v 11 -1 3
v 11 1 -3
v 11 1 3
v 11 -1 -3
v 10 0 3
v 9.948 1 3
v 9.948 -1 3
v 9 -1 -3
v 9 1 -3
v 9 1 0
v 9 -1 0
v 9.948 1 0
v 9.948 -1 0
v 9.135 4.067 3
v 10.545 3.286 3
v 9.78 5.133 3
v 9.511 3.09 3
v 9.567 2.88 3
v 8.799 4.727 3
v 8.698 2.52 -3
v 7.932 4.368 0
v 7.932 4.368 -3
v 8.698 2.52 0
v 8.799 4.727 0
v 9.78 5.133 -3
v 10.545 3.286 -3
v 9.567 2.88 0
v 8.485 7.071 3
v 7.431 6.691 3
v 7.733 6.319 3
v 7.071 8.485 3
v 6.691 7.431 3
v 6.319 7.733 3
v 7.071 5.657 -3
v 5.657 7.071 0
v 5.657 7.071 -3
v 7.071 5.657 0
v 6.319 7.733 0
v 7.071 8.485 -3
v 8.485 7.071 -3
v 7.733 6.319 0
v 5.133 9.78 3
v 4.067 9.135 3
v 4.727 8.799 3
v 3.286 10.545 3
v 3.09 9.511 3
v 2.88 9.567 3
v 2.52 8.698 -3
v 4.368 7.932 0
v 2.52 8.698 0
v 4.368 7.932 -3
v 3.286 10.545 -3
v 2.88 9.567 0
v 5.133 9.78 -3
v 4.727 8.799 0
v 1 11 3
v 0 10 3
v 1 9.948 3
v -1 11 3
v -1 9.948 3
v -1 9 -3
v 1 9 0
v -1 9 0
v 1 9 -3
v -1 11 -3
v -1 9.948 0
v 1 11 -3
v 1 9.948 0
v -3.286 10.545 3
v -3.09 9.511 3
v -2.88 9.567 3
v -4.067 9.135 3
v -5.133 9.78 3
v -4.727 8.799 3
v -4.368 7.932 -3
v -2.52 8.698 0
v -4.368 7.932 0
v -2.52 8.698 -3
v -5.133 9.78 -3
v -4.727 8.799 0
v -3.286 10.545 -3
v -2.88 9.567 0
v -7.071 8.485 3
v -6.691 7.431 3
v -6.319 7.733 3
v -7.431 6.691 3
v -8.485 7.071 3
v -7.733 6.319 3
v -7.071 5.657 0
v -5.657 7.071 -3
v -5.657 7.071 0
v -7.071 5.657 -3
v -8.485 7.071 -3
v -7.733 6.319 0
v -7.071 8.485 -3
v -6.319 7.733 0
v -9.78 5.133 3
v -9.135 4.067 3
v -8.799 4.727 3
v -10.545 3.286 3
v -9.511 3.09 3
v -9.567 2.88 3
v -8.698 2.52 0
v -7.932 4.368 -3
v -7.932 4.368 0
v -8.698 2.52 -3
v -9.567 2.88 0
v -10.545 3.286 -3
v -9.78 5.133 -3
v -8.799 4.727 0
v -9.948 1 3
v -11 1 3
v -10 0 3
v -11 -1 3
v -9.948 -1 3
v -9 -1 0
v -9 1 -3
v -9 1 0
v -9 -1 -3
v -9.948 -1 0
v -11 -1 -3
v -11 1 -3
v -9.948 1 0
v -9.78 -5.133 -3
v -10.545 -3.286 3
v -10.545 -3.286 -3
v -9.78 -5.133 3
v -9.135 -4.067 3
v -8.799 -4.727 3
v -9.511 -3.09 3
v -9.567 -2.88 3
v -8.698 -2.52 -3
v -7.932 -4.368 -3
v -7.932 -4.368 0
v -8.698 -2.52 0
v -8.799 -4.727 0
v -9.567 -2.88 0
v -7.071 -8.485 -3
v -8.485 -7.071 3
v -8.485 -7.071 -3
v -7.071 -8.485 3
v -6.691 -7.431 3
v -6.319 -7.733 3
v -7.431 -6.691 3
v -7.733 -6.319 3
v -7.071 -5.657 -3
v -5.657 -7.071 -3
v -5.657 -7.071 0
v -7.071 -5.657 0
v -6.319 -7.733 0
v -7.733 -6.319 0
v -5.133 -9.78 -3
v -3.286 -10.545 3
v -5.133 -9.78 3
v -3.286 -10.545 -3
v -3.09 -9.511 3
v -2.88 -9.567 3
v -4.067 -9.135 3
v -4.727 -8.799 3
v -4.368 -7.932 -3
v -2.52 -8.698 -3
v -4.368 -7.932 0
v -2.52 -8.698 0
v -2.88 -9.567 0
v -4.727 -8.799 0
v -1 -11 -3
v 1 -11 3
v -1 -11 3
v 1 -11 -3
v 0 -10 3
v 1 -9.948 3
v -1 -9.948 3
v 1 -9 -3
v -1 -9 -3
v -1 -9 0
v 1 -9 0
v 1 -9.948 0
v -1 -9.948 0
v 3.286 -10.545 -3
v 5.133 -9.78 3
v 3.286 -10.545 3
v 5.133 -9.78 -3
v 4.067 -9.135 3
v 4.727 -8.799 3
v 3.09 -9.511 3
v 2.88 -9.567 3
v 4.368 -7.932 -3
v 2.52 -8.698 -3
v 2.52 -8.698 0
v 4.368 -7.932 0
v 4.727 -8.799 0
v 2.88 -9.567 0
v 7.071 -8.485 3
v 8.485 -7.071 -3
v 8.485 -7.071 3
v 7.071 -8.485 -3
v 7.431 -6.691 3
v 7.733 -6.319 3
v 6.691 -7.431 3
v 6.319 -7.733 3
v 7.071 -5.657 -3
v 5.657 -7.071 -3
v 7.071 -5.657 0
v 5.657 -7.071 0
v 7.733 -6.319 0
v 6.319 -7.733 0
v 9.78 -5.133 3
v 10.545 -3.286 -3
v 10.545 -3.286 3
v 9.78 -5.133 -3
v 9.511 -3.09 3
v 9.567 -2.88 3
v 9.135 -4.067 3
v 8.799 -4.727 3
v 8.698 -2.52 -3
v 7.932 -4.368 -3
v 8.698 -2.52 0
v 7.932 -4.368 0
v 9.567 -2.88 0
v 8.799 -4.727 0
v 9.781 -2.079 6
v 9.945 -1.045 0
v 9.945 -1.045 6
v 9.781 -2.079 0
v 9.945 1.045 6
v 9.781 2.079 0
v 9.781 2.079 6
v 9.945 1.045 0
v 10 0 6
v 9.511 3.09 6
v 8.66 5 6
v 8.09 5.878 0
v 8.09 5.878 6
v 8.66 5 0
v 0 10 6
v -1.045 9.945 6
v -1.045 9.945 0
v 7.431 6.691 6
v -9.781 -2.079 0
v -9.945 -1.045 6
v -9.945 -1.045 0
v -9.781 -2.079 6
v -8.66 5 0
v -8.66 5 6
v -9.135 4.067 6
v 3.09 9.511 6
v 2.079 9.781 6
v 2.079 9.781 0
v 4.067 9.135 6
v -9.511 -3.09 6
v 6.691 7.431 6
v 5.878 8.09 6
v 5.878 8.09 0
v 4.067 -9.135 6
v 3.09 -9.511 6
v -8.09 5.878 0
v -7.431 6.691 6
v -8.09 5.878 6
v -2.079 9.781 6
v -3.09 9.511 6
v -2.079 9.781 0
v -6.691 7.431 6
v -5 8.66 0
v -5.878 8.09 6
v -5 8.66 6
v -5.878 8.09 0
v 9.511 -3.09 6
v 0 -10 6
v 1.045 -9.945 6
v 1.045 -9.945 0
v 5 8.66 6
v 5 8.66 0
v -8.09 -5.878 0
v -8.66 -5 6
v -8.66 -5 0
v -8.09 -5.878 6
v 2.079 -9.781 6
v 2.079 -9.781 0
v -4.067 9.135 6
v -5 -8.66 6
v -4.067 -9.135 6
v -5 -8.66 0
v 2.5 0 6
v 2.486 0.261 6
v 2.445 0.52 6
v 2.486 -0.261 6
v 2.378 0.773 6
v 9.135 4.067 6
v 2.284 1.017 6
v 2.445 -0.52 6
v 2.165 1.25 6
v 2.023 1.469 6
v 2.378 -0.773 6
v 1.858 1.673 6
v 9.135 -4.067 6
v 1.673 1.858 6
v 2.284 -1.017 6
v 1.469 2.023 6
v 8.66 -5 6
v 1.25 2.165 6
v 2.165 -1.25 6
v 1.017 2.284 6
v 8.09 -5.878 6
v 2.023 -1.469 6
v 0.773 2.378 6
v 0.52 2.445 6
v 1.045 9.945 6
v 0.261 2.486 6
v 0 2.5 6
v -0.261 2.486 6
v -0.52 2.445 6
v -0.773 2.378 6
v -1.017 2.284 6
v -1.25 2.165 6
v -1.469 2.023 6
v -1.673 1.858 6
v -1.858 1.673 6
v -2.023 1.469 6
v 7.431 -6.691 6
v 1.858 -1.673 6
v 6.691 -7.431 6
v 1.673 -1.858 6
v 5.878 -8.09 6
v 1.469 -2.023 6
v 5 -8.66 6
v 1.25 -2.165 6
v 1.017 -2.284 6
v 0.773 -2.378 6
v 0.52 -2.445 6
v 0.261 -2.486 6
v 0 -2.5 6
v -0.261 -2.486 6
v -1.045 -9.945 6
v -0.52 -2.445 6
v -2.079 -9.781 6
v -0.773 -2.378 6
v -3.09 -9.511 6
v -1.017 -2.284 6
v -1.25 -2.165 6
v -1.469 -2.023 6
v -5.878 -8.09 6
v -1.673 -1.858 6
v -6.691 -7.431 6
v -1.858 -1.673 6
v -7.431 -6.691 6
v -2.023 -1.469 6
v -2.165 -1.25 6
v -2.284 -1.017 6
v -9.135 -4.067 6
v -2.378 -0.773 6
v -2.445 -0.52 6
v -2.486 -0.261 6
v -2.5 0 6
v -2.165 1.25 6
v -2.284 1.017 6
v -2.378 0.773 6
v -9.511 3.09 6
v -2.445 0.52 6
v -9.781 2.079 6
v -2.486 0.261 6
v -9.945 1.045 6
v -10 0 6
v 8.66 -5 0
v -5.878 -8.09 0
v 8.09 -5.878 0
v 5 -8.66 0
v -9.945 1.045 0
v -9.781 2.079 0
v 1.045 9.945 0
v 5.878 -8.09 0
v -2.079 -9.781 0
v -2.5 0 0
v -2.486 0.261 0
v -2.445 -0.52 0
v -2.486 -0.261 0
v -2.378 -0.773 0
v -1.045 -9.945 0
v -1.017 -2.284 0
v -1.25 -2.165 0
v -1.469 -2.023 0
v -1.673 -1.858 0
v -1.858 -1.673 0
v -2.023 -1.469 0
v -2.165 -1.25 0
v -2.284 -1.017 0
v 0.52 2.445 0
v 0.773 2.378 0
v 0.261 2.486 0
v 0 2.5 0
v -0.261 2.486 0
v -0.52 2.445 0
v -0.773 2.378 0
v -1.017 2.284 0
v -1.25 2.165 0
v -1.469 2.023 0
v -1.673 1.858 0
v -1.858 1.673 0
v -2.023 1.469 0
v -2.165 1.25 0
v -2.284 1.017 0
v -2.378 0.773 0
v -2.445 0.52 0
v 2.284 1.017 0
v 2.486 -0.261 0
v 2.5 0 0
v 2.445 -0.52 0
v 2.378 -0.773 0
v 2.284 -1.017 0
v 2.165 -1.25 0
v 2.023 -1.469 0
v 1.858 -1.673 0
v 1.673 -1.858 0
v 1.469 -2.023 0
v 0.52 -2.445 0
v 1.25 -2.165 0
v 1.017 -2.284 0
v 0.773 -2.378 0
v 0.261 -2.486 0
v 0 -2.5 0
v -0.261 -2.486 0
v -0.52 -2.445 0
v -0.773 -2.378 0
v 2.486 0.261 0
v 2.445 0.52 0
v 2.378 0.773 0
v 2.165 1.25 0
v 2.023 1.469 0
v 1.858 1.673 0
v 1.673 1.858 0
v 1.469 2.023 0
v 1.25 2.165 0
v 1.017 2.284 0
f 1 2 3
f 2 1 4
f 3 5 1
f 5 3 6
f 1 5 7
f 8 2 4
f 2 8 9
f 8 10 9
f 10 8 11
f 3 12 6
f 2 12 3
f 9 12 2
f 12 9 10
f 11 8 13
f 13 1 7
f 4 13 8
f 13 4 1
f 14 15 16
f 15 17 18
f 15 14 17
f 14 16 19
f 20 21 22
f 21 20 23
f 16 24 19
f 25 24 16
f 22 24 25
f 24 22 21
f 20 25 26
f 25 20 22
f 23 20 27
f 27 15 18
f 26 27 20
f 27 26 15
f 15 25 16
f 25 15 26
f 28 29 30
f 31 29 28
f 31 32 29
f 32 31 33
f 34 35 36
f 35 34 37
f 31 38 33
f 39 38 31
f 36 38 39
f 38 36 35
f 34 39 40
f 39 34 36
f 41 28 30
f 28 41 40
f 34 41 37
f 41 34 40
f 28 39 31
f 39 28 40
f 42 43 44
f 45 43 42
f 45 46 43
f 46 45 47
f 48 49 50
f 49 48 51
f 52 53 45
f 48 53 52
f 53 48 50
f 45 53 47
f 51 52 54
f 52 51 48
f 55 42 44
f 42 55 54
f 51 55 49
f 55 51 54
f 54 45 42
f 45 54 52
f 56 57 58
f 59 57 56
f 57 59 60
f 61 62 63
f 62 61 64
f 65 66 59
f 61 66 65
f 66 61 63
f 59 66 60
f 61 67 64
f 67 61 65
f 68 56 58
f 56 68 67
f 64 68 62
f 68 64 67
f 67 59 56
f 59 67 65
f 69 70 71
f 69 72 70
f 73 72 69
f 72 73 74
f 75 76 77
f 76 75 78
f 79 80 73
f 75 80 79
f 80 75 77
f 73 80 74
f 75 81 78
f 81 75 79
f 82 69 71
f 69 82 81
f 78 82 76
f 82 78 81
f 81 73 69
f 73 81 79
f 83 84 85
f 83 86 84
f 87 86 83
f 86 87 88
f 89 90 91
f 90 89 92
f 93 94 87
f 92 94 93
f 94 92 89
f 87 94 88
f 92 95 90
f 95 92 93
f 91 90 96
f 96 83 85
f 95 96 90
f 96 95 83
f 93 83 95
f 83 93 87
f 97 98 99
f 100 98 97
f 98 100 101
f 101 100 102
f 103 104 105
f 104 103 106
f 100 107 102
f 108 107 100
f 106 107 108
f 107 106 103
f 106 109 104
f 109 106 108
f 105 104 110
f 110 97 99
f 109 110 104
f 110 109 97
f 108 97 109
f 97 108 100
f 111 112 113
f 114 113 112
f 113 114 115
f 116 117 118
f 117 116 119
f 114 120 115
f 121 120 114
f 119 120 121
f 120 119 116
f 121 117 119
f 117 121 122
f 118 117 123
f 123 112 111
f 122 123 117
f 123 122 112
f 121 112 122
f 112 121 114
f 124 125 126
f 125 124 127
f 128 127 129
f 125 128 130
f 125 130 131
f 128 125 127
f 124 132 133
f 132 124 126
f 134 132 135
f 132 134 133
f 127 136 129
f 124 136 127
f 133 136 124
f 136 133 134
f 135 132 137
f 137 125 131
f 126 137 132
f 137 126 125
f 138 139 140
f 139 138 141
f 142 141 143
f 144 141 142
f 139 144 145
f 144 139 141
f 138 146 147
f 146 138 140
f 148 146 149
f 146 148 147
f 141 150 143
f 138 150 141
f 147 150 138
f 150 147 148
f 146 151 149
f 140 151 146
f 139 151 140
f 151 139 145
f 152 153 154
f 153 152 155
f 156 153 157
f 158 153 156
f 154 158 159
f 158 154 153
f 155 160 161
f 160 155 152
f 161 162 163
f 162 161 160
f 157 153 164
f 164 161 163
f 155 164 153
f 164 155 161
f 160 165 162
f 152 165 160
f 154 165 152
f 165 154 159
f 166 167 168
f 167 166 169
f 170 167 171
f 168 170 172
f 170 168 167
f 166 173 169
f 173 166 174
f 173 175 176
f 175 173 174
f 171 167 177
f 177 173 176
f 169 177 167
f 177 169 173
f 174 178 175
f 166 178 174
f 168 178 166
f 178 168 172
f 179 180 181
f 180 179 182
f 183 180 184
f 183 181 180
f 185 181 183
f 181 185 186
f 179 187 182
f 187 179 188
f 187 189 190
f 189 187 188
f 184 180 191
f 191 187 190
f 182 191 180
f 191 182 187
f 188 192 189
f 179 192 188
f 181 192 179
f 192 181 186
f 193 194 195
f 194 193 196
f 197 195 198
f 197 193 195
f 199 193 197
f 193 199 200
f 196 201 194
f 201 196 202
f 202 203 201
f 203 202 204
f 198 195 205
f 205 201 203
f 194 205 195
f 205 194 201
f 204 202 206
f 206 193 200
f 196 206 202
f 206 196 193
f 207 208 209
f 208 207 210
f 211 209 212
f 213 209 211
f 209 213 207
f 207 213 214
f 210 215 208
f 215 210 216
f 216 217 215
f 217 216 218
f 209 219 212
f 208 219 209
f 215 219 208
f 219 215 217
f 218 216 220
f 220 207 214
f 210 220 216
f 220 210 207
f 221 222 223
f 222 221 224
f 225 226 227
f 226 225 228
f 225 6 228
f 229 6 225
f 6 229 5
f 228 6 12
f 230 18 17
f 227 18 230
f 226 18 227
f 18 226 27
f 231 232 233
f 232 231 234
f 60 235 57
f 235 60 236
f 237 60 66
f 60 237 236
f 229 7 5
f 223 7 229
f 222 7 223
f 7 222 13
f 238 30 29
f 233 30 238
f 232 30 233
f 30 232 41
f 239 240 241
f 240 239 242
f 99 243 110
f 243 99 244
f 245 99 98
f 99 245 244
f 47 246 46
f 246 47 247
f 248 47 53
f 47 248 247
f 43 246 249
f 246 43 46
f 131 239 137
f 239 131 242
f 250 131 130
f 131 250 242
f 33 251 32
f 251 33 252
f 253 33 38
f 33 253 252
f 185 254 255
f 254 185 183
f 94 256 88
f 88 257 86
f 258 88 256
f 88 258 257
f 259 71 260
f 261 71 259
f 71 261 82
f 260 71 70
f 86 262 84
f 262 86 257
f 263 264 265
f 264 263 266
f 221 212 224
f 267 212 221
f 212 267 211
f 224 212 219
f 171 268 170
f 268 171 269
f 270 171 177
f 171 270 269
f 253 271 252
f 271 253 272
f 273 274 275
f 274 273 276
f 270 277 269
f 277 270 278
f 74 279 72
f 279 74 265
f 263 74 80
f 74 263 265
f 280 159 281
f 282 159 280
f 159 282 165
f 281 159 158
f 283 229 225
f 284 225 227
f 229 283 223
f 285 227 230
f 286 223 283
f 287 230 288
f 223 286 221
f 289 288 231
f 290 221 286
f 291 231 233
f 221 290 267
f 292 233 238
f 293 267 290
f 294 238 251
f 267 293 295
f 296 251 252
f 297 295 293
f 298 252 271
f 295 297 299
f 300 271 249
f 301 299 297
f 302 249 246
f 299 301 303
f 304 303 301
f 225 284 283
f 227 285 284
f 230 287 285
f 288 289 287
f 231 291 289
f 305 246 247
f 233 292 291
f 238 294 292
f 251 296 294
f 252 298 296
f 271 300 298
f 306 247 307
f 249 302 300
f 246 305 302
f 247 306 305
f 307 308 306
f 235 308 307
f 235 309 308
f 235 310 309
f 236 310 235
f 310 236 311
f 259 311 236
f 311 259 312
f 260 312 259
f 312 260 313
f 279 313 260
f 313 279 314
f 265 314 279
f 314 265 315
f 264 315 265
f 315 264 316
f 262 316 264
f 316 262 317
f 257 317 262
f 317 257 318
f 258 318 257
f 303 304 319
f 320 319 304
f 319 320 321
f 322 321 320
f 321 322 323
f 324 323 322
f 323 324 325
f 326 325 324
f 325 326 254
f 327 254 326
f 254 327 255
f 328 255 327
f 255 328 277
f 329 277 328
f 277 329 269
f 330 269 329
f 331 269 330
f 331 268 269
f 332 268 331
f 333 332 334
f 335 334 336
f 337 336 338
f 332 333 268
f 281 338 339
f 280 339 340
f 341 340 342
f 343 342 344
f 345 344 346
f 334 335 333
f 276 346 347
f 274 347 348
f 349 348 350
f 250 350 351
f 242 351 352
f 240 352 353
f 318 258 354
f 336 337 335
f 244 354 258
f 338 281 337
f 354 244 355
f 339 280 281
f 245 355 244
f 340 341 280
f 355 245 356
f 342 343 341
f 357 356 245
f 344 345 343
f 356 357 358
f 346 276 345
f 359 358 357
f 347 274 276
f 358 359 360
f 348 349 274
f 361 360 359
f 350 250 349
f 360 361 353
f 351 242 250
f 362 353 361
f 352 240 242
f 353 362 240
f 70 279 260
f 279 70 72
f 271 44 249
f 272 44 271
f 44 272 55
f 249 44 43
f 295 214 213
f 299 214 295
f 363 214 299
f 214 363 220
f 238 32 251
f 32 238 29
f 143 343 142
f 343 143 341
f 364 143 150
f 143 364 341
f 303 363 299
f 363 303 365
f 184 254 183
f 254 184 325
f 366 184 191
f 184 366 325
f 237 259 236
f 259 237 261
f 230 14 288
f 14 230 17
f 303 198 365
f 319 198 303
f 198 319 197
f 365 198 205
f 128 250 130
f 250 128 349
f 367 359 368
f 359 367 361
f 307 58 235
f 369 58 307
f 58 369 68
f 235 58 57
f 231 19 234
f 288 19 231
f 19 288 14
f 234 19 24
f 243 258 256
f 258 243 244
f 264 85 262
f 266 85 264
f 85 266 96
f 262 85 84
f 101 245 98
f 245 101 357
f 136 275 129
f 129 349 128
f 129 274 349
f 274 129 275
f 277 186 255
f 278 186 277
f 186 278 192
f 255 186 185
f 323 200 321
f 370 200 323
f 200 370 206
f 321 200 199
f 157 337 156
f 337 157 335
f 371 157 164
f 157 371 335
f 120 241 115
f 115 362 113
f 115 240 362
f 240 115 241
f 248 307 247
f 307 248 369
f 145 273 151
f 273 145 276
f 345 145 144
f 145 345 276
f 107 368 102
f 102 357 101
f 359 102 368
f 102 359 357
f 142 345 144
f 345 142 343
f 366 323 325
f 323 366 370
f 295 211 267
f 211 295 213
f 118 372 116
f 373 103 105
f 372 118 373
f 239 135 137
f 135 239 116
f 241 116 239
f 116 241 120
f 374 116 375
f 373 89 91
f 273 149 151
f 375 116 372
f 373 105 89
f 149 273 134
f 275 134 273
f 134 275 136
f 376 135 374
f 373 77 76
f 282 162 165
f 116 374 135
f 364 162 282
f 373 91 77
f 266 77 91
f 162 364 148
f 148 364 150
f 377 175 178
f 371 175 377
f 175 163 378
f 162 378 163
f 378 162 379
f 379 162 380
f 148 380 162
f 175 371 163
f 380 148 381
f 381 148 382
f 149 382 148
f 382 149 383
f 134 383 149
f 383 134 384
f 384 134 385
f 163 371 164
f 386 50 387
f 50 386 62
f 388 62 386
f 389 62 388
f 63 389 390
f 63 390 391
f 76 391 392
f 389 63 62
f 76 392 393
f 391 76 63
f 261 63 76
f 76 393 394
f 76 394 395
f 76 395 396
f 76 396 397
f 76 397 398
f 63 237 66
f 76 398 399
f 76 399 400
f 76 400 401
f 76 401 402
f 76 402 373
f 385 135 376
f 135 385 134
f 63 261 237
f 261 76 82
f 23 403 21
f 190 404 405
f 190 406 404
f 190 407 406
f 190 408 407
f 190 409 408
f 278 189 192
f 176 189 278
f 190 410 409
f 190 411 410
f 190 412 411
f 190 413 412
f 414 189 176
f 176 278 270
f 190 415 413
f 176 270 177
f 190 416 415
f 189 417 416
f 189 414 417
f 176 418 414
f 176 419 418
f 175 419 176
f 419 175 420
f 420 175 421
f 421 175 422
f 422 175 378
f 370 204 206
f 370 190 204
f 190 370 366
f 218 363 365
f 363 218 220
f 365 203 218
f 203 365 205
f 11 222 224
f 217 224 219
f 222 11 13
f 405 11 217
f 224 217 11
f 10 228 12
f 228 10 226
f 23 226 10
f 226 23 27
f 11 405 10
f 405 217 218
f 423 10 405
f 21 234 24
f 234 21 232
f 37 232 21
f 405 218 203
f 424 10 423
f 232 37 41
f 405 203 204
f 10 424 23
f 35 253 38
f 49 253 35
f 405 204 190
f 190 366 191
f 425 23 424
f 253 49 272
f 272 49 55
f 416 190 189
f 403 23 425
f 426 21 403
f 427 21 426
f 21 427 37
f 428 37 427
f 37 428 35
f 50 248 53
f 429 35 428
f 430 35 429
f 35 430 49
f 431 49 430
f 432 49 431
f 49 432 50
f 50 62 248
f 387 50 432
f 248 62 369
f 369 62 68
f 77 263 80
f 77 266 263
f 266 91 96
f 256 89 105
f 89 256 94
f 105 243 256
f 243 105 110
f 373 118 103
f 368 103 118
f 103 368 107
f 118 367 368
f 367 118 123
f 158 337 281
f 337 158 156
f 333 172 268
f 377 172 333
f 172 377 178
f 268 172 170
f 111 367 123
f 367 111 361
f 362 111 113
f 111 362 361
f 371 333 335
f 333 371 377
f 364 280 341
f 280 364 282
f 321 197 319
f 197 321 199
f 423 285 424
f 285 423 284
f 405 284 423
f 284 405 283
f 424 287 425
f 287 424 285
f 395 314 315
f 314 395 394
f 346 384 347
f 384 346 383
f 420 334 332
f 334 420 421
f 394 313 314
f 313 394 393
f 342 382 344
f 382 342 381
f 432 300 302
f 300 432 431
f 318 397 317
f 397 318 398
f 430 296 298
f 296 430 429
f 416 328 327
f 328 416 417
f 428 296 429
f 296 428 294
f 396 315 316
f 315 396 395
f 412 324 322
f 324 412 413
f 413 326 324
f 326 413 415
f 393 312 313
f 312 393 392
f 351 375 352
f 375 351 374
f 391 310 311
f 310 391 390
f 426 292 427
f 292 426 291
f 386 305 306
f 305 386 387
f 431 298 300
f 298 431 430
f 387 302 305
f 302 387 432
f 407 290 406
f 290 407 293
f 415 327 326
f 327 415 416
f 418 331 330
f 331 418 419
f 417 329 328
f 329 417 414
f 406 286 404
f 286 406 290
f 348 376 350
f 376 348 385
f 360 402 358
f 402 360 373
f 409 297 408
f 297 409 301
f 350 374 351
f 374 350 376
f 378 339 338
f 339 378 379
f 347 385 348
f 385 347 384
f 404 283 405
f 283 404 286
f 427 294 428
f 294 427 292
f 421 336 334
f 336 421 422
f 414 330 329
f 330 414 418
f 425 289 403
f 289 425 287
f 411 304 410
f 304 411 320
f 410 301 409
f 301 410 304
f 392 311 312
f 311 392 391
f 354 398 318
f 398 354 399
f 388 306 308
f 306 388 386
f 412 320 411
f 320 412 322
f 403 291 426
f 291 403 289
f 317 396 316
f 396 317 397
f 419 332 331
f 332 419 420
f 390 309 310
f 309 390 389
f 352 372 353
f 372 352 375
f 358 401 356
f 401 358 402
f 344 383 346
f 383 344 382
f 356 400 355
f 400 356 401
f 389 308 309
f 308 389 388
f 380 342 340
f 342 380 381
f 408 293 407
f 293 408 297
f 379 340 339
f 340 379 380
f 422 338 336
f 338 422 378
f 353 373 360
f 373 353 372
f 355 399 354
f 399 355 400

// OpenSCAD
// Gear blank with external locator teeth.
$fn = 60;
eps = 0.02;
bore_d = 5;
root_d = 20;
teeth = 16;
thickness = 6;
difference() { union() { cylinder(d=root_d,h=thickness); for(i=[0:teeth-1]) rotate([0,0,i*360/teeth]) translate([root_d/2,0,0]) cube([2,max(2,root_d*0.08),thickness],center=true); } translate([0,0,-eps]) cylinder(d=bore_d,h=thickness+2*eps); }
